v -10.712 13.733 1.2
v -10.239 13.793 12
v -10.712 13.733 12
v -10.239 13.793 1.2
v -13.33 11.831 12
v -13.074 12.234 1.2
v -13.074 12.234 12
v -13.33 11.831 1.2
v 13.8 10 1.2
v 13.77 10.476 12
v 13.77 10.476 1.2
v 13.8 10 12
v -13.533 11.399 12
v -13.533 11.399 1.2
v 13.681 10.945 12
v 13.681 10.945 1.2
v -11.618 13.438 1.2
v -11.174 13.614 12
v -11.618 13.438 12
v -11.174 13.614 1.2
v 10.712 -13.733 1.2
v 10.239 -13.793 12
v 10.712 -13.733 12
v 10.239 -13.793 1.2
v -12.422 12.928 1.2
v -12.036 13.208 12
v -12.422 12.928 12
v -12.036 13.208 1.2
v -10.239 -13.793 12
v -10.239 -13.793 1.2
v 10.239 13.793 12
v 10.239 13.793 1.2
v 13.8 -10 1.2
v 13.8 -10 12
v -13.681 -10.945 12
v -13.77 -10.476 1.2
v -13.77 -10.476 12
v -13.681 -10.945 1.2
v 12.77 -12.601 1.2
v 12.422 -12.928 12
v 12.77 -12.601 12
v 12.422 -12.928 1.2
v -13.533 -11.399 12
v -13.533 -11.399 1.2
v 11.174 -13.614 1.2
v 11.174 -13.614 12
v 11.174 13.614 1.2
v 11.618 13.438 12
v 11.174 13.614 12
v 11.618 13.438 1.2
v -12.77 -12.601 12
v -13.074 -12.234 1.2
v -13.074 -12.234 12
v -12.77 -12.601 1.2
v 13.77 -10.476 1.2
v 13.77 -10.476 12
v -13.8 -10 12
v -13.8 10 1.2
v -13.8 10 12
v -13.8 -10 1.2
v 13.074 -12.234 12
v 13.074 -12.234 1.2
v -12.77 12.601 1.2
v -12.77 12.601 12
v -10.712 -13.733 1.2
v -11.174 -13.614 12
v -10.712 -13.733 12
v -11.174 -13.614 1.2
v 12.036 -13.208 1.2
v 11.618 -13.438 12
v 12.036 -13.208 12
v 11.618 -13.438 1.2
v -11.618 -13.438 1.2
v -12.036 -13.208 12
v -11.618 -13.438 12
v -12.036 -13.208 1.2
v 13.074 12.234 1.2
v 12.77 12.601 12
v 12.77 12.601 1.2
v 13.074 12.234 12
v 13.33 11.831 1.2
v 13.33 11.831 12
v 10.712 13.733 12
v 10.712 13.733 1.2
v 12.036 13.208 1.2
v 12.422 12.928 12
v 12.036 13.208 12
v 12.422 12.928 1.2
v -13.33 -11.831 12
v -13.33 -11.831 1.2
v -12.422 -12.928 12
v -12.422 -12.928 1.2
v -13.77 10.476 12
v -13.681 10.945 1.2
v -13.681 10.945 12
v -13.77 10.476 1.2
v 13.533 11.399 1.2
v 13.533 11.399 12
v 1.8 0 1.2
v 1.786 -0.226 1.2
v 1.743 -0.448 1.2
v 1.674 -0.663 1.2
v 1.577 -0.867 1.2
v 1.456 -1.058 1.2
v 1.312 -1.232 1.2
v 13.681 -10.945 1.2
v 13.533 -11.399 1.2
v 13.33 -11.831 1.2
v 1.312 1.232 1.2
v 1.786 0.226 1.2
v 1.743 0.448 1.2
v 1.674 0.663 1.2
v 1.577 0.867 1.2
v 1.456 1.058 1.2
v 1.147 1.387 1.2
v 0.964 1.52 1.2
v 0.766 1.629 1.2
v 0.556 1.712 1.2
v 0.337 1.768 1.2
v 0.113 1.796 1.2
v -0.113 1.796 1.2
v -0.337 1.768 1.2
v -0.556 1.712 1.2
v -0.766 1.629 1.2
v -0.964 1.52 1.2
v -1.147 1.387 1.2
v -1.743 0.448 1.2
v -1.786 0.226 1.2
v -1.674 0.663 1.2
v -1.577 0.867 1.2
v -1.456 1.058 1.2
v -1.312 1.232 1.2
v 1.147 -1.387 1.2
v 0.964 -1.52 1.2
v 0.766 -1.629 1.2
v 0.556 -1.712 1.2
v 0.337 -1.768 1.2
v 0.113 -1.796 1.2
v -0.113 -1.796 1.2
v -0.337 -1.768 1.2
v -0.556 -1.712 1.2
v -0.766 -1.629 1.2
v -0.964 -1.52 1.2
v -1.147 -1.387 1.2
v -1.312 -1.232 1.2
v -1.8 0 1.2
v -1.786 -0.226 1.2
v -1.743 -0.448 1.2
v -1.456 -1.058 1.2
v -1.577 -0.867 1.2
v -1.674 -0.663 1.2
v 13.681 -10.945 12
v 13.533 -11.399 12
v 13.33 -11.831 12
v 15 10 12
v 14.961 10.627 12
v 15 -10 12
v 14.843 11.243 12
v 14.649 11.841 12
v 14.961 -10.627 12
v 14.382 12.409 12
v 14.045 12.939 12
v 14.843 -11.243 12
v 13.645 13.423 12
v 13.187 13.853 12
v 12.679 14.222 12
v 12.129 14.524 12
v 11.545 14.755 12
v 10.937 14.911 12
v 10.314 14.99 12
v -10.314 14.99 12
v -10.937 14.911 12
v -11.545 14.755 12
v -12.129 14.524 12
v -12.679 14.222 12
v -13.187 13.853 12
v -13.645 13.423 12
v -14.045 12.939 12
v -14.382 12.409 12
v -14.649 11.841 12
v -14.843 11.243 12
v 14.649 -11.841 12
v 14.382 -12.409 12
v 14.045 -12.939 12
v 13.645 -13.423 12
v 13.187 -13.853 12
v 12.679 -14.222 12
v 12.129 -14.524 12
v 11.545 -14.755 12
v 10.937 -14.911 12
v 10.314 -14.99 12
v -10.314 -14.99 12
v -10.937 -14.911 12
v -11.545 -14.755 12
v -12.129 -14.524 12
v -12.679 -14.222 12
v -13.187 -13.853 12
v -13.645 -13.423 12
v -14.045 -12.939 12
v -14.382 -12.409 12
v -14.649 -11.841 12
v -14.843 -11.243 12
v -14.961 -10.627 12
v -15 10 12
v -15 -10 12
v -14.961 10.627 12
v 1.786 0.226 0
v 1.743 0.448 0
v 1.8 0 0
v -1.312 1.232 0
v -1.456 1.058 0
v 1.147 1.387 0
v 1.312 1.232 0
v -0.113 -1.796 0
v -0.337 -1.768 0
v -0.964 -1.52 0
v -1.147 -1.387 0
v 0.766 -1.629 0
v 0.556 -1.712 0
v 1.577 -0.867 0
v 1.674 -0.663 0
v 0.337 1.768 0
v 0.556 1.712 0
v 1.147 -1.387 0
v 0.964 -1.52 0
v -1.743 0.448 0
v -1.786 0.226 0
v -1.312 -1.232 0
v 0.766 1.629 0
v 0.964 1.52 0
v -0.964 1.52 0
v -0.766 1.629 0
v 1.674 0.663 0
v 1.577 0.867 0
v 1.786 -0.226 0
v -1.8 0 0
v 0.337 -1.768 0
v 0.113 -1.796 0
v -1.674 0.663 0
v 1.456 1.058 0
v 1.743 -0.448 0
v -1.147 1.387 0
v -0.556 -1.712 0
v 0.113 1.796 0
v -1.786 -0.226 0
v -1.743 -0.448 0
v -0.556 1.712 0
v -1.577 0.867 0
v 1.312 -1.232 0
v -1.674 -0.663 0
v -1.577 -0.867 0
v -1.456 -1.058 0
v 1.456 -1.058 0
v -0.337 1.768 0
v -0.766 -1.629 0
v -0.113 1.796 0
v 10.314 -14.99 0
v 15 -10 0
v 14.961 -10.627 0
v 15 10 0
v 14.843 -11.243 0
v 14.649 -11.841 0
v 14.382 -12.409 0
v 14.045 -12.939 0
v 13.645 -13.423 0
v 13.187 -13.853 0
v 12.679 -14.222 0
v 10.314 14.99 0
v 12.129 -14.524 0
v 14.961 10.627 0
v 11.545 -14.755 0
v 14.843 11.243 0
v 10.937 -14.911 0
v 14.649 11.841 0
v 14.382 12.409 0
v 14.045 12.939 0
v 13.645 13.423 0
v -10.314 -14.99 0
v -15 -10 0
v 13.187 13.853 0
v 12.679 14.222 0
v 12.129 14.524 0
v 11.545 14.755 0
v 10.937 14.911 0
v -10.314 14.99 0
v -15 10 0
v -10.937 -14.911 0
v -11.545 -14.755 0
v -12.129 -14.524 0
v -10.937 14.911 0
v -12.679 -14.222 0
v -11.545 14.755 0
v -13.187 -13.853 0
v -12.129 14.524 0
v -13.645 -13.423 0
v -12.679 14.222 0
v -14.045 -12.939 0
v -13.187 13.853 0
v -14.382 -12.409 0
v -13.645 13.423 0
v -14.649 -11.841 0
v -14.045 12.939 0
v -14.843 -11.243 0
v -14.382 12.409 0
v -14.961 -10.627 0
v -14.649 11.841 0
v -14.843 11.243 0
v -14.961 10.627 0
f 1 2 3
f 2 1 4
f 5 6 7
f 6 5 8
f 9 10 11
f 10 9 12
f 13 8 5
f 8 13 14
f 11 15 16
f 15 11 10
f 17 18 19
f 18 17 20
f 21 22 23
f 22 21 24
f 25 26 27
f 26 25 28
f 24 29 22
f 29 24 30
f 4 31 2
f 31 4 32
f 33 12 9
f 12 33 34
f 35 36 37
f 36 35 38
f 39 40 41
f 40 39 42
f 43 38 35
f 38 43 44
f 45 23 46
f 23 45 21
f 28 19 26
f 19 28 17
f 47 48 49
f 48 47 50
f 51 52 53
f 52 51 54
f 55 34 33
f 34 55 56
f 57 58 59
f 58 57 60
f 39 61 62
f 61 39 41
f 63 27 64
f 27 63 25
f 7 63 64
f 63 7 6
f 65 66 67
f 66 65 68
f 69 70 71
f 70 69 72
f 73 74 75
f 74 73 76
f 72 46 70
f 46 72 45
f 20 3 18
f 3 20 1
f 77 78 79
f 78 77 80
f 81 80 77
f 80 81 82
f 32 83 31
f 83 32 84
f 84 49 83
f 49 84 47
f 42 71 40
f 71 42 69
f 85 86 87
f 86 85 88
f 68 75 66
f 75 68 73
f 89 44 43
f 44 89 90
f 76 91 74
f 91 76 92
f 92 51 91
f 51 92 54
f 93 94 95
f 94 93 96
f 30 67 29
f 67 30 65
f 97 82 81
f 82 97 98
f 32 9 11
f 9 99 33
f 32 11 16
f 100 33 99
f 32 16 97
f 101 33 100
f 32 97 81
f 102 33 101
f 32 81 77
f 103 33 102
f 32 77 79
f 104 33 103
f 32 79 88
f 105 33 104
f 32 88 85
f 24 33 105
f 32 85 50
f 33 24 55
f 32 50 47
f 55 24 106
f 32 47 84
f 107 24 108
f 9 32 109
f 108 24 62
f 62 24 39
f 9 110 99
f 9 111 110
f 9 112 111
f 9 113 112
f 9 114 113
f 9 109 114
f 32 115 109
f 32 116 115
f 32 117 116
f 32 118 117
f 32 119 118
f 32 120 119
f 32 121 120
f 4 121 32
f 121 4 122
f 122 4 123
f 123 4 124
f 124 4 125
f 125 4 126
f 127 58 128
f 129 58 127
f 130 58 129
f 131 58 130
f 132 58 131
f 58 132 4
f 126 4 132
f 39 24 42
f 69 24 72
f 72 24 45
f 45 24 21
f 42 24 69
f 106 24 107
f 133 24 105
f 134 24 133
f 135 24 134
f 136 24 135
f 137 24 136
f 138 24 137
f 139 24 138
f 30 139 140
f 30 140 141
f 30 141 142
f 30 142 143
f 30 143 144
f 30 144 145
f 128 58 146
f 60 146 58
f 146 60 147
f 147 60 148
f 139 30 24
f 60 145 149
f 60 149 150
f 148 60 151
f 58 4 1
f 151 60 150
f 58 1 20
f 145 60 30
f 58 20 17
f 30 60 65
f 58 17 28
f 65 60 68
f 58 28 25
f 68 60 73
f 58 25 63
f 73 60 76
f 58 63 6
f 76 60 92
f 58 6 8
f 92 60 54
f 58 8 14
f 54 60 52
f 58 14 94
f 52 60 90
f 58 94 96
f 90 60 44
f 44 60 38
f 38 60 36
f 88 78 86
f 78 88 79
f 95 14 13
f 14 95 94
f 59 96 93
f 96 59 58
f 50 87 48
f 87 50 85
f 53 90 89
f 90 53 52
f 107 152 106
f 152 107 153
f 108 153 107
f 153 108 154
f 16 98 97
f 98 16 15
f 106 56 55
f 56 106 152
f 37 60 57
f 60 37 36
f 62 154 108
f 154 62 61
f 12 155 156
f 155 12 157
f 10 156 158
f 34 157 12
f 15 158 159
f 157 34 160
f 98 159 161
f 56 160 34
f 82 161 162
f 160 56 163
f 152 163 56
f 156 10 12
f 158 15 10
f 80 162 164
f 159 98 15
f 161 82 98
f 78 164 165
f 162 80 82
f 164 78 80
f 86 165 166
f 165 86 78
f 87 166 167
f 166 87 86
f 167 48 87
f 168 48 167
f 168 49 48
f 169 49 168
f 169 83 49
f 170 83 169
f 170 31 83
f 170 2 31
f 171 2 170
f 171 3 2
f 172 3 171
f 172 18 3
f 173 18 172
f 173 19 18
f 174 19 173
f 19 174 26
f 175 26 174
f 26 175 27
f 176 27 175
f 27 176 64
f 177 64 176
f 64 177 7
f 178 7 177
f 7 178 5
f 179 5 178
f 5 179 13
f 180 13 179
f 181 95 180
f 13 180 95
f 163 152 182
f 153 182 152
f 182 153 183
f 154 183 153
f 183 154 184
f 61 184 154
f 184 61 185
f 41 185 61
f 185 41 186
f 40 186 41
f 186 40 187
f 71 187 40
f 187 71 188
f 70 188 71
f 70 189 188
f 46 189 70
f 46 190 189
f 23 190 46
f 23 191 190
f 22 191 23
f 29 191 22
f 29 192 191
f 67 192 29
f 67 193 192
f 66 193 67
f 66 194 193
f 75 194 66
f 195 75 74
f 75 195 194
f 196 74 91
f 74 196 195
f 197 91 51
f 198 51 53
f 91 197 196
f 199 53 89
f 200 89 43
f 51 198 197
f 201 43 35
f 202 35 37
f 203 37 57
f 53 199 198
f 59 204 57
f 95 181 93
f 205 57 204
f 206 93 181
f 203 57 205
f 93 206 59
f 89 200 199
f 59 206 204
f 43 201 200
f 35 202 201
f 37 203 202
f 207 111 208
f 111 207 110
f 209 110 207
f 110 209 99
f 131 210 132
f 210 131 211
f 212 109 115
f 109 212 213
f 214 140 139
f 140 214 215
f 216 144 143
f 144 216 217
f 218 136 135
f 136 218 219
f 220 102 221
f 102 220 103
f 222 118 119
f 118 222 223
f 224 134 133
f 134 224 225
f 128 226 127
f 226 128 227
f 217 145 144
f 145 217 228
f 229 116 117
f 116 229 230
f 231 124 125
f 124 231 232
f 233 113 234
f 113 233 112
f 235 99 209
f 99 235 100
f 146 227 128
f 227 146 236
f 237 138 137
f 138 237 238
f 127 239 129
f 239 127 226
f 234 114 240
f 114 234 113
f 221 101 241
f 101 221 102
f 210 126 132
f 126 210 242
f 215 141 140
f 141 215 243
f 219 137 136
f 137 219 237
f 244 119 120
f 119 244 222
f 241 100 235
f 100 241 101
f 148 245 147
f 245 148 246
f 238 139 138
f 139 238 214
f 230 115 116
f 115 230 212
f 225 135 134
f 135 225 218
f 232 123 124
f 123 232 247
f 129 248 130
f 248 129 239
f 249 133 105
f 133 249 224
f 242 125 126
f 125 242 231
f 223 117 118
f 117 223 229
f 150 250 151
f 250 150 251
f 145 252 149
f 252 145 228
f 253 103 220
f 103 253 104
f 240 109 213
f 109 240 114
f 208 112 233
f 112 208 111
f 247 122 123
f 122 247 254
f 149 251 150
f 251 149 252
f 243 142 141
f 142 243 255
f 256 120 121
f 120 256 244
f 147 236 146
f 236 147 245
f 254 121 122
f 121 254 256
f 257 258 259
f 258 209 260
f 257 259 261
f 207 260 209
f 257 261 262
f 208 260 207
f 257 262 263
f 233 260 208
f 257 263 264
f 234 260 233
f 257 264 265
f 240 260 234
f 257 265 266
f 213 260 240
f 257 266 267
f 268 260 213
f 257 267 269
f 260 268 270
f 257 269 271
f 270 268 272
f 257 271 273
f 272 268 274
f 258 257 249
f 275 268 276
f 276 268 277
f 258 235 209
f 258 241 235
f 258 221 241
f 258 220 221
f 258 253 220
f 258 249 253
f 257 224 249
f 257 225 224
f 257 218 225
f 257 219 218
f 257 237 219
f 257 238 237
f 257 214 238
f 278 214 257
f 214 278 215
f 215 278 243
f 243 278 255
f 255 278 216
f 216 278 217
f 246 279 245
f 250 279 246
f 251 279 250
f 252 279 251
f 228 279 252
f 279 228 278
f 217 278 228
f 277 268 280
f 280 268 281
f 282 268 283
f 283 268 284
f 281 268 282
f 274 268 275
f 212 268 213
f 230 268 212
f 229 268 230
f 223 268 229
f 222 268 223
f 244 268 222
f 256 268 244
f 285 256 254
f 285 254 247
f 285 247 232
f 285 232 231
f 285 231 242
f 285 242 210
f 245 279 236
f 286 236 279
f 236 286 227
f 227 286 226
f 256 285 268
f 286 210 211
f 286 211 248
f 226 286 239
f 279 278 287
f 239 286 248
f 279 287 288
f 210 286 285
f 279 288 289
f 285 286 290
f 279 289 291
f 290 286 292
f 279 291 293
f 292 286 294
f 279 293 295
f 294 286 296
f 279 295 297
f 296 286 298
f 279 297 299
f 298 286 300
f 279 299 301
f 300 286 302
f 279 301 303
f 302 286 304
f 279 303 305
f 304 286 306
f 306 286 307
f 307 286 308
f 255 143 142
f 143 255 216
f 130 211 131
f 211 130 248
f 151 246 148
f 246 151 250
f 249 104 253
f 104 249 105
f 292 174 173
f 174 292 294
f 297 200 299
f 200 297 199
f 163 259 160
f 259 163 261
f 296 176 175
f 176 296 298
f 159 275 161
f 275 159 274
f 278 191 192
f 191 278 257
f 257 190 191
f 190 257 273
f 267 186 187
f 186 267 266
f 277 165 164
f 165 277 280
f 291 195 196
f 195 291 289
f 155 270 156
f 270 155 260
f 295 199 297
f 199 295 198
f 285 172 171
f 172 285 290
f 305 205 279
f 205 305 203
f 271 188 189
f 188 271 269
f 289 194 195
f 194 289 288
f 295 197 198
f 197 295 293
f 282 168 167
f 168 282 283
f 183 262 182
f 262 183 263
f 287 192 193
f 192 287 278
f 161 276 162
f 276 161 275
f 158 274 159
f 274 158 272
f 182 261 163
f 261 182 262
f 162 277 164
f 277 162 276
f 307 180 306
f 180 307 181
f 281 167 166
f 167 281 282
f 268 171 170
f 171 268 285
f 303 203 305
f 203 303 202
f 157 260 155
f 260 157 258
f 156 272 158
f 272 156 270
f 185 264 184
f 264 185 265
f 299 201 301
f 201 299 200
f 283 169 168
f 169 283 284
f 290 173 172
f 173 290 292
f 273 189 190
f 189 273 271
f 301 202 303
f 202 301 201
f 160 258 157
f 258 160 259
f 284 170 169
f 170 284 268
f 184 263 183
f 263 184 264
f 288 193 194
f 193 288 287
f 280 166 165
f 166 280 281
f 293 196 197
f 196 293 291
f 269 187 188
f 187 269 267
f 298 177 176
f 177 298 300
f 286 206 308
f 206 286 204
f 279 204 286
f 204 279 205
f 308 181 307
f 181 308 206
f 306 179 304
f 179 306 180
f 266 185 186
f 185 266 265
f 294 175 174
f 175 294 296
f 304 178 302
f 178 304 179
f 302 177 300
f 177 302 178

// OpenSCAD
$fn = 50;


difference() {
	union() {
		hull() {
			translate(v = [-10.0000000000, 10.0000000000, 0]) {
				cylinder(h = 12, r = 5);
			}
			translate(v = [10.0000000000, 10.0000000000, 0]) {
				cylinder(h = 12, r = 5);
			}
			translate(v = [-10.0000000000, -10.0000000000, 0]) {
				cylinder(h = 12, r = 5);
			}
			translate(v = [10.0000000000, -10.0000000000, 0]) {
				cylinder(h = 12, r = 5);
			}
		}
	}
	union() {
		translate(v = [0, 0, 1.2000000000]) {
			hull() {
				translate(v = [-10.0000000000, 10.0000000000, 0]) {
					cylinder(h = 10.8000000000, r = 3.8000000000);
				}
				translate(v = [10.0000000000, 10.0000000000, 0]) {
					cylinder(h = 10.8000000000, r = 3.8000000000);
				}
				translate(v = [-10.0000000000, -10.0000000000, 0]) {
					cylinder(h = 10.8000000000, r = 3.8000000000);
				}
				translate(v = [10.0000000000, -10.0000000000, 0]) {
					cylinder(h = 10.8000000000, r = 3.8000000000);
				}
			}
		}
		#cylinder(h = 1.2000000000, r = 1.8000000000);
	}
}
